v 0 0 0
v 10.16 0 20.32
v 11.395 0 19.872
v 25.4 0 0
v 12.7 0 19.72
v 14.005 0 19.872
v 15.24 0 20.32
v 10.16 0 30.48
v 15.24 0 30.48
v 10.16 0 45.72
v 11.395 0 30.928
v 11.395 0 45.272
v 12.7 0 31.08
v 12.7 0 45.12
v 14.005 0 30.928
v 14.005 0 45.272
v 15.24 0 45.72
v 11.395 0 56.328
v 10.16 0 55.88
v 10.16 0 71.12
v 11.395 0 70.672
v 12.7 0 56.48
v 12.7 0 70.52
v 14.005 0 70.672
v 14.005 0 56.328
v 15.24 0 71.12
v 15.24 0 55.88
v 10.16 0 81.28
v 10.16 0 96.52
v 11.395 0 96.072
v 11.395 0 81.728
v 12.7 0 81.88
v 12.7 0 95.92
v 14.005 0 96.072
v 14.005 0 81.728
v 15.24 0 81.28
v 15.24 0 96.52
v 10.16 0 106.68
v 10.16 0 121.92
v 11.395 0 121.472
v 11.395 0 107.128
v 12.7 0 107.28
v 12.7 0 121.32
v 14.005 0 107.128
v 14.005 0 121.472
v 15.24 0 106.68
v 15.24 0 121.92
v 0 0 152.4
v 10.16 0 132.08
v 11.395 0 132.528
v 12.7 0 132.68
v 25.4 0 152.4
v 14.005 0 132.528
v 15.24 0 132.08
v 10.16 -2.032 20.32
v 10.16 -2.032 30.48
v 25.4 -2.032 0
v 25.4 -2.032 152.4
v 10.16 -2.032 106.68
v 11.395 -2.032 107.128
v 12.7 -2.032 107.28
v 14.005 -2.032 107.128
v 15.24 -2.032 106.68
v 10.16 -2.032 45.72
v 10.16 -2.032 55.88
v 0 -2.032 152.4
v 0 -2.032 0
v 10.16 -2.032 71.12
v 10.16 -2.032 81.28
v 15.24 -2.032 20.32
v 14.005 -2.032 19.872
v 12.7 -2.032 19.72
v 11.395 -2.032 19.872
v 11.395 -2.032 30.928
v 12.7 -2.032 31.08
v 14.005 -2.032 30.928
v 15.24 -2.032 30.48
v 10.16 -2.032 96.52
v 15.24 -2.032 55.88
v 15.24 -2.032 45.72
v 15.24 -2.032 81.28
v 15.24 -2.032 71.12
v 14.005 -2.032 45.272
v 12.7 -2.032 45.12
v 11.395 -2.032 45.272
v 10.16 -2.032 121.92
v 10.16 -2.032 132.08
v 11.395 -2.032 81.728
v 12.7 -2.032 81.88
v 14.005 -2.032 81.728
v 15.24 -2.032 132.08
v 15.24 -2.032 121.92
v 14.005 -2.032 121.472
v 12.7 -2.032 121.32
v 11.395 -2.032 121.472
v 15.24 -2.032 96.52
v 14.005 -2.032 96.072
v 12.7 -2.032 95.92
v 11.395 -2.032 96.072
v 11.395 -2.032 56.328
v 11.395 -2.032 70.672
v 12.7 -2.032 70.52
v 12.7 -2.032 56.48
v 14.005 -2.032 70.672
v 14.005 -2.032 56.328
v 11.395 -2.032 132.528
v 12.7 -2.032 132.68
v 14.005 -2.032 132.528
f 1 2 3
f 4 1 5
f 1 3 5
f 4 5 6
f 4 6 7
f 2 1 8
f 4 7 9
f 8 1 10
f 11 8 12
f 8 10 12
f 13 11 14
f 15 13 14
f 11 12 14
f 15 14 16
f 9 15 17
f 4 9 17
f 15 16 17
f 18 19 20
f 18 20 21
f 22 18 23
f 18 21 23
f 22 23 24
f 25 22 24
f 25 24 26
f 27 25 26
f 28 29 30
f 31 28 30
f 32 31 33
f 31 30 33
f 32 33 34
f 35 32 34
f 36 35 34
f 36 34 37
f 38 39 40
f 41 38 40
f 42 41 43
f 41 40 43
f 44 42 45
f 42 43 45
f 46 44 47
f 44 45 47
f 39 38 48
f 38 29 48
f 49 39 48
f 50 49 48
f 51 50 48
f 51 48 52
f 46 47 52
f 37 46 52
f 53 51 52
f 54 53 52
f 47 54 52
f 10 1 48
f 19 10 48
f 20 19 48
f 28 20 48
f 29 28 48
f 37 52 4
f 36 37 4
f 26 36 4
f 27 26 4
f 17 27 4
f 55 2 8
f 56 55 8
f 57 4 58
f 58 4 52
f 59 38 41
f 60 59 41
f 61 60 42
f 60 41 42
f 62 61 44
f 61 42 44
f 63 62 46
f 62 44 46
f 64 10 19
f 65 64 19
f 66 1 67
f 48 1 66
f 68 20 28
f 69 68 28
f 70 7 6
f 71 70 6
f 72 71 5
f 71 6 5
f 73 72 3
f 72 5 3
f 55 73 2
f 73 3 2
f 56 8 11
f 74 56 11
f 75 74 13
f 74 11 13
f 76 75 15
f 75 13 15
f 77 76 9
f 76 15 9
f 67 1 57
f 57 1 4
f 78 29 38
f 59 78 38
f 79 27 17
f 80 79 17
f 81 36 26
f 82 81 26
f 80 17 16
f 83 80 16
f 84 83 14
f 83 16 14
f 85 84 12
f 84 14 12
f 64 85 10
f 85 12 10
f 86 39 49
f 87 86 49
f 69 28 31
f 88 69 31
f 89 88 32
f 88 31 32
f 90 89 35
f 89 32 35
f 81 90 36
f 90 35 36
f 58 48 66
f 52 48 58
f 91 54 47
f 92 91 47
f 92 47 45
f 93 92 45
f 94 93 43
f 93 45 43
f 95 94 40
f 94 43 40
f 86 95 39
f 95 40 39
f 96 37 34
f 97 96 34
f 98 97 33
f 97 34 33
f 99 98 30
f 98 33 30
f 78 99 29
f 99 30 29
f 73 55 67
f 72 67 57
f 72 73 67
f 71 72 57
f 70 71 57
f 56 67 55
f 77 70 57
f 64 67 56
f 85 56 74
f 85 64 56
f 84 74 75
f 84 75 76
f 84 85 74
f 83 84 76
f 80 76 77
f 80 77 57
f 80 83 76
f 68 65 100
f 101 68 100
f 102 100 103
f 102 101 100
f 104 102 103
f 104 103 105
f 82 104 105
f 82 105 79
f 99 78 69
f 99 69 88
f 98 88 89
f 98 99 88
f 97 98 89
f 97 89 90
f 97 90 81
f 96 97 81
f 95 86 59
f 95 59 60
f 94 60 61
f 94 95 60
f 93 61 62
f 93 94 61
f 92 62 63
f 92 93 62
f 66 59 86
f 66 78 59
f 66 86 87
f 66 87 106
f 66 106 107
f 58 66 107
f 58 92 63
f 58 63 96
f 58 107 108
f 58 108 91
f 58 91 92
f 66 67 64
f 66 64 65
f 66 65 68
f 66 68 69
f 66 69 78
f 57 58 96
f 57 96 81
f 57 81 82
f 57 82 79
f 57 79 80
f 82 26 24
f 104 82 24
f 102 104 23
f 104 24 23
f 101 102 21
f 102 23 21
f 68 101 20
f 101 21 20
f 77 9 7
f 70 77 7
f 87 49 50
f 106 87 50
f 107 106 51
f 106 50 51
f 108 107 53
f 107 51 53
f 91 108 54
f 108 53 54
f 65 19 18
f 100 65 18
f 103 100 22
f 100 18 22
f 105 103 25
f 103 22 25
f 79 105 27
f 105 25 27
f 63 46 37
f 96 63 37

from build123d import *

# Parameters (mm, degrees)
F0_W     = 25.4
F0_H     = 152.4
F1_DEPTH = 2.032


with BuildPart() as f1:
    # F0 (on Front) → F1 (new body)
    with BuildSketch(Plane.XZ):
        with Locations((12.7, 76.2)):
            Rectangle(F0_W, F0_H)
        with BuildLine():
            ThreePointArc((10.16, 30.48), (12.7, 31.0796126628), (15.24, 30.48))
            Line((15.24, 30.48), (15.24, 20.32))
            ThreePointArc((15.24, 20.32), (12.7, 19.7203873372), (10.16, 20.32))
            Line((10.16, 20.32), (10.16, 30.48))
        make_face(mode=Mode.SUBTRACT)
        with BuildLine():
            ThreePointArc((10.16, 55.88), (12.7, 56.4796126628), (15.24, 55.88))
            Line((15.24, 55.88), (15.24, 45.72))
            ThreePointArc((15.24, 45.72), (12.7, 45.1203873372), (10.16, 45.72))
            Line((10.16, 45.72), (10.16, 55.88))
        make_face(mode=Mode.SUBTRACT)
        with BuildLine():
            ThreePointArc((10.16, 81.28), (12.7, 81.8796126628), (15.24, 81.28))
            Line((15.24, 81.28), (15.24, 71.12))
            ThreePointArc((15.24, 71.12), (12.7, 70.5203873372), (10.16, 71.12))
            Line((10.16, 71.12), (10.16, 81.28))
        make_face(mode=Mode.SUBTRACT)
        with BuildLine():
            ThreePointArc((10.16, 106.68), (12.7, 107.2796126628), (15.24, 106.68))
            Line((15.24, 106.68), (15.24, 96.52))
            ThreePointArc((15.24, 96.52), (12.7, 95.9203873372), (10.16, 96.52))
            Line((10.16, 96.52), (10.16, 106.68))
        make_face(mode=Mode.SUBTRACT)
        with BuildLine():
            ThreePointArc((10.16, 132.08), (12.7, 132.6796126628), (15.24, 132.08))
            Line((15.24, 132.08), (15.24, 121.92))
            ThreePointArc((15.24, 121.92), (12.7, 121.3203873372), (10.16, 121.92))
            Line((10.16, 121.92), (10.16, 132.08))
        make_face(mode=Mode.SUBTRACT)
    extrude(amount=F1_DEPTH)


solid = f1.part
